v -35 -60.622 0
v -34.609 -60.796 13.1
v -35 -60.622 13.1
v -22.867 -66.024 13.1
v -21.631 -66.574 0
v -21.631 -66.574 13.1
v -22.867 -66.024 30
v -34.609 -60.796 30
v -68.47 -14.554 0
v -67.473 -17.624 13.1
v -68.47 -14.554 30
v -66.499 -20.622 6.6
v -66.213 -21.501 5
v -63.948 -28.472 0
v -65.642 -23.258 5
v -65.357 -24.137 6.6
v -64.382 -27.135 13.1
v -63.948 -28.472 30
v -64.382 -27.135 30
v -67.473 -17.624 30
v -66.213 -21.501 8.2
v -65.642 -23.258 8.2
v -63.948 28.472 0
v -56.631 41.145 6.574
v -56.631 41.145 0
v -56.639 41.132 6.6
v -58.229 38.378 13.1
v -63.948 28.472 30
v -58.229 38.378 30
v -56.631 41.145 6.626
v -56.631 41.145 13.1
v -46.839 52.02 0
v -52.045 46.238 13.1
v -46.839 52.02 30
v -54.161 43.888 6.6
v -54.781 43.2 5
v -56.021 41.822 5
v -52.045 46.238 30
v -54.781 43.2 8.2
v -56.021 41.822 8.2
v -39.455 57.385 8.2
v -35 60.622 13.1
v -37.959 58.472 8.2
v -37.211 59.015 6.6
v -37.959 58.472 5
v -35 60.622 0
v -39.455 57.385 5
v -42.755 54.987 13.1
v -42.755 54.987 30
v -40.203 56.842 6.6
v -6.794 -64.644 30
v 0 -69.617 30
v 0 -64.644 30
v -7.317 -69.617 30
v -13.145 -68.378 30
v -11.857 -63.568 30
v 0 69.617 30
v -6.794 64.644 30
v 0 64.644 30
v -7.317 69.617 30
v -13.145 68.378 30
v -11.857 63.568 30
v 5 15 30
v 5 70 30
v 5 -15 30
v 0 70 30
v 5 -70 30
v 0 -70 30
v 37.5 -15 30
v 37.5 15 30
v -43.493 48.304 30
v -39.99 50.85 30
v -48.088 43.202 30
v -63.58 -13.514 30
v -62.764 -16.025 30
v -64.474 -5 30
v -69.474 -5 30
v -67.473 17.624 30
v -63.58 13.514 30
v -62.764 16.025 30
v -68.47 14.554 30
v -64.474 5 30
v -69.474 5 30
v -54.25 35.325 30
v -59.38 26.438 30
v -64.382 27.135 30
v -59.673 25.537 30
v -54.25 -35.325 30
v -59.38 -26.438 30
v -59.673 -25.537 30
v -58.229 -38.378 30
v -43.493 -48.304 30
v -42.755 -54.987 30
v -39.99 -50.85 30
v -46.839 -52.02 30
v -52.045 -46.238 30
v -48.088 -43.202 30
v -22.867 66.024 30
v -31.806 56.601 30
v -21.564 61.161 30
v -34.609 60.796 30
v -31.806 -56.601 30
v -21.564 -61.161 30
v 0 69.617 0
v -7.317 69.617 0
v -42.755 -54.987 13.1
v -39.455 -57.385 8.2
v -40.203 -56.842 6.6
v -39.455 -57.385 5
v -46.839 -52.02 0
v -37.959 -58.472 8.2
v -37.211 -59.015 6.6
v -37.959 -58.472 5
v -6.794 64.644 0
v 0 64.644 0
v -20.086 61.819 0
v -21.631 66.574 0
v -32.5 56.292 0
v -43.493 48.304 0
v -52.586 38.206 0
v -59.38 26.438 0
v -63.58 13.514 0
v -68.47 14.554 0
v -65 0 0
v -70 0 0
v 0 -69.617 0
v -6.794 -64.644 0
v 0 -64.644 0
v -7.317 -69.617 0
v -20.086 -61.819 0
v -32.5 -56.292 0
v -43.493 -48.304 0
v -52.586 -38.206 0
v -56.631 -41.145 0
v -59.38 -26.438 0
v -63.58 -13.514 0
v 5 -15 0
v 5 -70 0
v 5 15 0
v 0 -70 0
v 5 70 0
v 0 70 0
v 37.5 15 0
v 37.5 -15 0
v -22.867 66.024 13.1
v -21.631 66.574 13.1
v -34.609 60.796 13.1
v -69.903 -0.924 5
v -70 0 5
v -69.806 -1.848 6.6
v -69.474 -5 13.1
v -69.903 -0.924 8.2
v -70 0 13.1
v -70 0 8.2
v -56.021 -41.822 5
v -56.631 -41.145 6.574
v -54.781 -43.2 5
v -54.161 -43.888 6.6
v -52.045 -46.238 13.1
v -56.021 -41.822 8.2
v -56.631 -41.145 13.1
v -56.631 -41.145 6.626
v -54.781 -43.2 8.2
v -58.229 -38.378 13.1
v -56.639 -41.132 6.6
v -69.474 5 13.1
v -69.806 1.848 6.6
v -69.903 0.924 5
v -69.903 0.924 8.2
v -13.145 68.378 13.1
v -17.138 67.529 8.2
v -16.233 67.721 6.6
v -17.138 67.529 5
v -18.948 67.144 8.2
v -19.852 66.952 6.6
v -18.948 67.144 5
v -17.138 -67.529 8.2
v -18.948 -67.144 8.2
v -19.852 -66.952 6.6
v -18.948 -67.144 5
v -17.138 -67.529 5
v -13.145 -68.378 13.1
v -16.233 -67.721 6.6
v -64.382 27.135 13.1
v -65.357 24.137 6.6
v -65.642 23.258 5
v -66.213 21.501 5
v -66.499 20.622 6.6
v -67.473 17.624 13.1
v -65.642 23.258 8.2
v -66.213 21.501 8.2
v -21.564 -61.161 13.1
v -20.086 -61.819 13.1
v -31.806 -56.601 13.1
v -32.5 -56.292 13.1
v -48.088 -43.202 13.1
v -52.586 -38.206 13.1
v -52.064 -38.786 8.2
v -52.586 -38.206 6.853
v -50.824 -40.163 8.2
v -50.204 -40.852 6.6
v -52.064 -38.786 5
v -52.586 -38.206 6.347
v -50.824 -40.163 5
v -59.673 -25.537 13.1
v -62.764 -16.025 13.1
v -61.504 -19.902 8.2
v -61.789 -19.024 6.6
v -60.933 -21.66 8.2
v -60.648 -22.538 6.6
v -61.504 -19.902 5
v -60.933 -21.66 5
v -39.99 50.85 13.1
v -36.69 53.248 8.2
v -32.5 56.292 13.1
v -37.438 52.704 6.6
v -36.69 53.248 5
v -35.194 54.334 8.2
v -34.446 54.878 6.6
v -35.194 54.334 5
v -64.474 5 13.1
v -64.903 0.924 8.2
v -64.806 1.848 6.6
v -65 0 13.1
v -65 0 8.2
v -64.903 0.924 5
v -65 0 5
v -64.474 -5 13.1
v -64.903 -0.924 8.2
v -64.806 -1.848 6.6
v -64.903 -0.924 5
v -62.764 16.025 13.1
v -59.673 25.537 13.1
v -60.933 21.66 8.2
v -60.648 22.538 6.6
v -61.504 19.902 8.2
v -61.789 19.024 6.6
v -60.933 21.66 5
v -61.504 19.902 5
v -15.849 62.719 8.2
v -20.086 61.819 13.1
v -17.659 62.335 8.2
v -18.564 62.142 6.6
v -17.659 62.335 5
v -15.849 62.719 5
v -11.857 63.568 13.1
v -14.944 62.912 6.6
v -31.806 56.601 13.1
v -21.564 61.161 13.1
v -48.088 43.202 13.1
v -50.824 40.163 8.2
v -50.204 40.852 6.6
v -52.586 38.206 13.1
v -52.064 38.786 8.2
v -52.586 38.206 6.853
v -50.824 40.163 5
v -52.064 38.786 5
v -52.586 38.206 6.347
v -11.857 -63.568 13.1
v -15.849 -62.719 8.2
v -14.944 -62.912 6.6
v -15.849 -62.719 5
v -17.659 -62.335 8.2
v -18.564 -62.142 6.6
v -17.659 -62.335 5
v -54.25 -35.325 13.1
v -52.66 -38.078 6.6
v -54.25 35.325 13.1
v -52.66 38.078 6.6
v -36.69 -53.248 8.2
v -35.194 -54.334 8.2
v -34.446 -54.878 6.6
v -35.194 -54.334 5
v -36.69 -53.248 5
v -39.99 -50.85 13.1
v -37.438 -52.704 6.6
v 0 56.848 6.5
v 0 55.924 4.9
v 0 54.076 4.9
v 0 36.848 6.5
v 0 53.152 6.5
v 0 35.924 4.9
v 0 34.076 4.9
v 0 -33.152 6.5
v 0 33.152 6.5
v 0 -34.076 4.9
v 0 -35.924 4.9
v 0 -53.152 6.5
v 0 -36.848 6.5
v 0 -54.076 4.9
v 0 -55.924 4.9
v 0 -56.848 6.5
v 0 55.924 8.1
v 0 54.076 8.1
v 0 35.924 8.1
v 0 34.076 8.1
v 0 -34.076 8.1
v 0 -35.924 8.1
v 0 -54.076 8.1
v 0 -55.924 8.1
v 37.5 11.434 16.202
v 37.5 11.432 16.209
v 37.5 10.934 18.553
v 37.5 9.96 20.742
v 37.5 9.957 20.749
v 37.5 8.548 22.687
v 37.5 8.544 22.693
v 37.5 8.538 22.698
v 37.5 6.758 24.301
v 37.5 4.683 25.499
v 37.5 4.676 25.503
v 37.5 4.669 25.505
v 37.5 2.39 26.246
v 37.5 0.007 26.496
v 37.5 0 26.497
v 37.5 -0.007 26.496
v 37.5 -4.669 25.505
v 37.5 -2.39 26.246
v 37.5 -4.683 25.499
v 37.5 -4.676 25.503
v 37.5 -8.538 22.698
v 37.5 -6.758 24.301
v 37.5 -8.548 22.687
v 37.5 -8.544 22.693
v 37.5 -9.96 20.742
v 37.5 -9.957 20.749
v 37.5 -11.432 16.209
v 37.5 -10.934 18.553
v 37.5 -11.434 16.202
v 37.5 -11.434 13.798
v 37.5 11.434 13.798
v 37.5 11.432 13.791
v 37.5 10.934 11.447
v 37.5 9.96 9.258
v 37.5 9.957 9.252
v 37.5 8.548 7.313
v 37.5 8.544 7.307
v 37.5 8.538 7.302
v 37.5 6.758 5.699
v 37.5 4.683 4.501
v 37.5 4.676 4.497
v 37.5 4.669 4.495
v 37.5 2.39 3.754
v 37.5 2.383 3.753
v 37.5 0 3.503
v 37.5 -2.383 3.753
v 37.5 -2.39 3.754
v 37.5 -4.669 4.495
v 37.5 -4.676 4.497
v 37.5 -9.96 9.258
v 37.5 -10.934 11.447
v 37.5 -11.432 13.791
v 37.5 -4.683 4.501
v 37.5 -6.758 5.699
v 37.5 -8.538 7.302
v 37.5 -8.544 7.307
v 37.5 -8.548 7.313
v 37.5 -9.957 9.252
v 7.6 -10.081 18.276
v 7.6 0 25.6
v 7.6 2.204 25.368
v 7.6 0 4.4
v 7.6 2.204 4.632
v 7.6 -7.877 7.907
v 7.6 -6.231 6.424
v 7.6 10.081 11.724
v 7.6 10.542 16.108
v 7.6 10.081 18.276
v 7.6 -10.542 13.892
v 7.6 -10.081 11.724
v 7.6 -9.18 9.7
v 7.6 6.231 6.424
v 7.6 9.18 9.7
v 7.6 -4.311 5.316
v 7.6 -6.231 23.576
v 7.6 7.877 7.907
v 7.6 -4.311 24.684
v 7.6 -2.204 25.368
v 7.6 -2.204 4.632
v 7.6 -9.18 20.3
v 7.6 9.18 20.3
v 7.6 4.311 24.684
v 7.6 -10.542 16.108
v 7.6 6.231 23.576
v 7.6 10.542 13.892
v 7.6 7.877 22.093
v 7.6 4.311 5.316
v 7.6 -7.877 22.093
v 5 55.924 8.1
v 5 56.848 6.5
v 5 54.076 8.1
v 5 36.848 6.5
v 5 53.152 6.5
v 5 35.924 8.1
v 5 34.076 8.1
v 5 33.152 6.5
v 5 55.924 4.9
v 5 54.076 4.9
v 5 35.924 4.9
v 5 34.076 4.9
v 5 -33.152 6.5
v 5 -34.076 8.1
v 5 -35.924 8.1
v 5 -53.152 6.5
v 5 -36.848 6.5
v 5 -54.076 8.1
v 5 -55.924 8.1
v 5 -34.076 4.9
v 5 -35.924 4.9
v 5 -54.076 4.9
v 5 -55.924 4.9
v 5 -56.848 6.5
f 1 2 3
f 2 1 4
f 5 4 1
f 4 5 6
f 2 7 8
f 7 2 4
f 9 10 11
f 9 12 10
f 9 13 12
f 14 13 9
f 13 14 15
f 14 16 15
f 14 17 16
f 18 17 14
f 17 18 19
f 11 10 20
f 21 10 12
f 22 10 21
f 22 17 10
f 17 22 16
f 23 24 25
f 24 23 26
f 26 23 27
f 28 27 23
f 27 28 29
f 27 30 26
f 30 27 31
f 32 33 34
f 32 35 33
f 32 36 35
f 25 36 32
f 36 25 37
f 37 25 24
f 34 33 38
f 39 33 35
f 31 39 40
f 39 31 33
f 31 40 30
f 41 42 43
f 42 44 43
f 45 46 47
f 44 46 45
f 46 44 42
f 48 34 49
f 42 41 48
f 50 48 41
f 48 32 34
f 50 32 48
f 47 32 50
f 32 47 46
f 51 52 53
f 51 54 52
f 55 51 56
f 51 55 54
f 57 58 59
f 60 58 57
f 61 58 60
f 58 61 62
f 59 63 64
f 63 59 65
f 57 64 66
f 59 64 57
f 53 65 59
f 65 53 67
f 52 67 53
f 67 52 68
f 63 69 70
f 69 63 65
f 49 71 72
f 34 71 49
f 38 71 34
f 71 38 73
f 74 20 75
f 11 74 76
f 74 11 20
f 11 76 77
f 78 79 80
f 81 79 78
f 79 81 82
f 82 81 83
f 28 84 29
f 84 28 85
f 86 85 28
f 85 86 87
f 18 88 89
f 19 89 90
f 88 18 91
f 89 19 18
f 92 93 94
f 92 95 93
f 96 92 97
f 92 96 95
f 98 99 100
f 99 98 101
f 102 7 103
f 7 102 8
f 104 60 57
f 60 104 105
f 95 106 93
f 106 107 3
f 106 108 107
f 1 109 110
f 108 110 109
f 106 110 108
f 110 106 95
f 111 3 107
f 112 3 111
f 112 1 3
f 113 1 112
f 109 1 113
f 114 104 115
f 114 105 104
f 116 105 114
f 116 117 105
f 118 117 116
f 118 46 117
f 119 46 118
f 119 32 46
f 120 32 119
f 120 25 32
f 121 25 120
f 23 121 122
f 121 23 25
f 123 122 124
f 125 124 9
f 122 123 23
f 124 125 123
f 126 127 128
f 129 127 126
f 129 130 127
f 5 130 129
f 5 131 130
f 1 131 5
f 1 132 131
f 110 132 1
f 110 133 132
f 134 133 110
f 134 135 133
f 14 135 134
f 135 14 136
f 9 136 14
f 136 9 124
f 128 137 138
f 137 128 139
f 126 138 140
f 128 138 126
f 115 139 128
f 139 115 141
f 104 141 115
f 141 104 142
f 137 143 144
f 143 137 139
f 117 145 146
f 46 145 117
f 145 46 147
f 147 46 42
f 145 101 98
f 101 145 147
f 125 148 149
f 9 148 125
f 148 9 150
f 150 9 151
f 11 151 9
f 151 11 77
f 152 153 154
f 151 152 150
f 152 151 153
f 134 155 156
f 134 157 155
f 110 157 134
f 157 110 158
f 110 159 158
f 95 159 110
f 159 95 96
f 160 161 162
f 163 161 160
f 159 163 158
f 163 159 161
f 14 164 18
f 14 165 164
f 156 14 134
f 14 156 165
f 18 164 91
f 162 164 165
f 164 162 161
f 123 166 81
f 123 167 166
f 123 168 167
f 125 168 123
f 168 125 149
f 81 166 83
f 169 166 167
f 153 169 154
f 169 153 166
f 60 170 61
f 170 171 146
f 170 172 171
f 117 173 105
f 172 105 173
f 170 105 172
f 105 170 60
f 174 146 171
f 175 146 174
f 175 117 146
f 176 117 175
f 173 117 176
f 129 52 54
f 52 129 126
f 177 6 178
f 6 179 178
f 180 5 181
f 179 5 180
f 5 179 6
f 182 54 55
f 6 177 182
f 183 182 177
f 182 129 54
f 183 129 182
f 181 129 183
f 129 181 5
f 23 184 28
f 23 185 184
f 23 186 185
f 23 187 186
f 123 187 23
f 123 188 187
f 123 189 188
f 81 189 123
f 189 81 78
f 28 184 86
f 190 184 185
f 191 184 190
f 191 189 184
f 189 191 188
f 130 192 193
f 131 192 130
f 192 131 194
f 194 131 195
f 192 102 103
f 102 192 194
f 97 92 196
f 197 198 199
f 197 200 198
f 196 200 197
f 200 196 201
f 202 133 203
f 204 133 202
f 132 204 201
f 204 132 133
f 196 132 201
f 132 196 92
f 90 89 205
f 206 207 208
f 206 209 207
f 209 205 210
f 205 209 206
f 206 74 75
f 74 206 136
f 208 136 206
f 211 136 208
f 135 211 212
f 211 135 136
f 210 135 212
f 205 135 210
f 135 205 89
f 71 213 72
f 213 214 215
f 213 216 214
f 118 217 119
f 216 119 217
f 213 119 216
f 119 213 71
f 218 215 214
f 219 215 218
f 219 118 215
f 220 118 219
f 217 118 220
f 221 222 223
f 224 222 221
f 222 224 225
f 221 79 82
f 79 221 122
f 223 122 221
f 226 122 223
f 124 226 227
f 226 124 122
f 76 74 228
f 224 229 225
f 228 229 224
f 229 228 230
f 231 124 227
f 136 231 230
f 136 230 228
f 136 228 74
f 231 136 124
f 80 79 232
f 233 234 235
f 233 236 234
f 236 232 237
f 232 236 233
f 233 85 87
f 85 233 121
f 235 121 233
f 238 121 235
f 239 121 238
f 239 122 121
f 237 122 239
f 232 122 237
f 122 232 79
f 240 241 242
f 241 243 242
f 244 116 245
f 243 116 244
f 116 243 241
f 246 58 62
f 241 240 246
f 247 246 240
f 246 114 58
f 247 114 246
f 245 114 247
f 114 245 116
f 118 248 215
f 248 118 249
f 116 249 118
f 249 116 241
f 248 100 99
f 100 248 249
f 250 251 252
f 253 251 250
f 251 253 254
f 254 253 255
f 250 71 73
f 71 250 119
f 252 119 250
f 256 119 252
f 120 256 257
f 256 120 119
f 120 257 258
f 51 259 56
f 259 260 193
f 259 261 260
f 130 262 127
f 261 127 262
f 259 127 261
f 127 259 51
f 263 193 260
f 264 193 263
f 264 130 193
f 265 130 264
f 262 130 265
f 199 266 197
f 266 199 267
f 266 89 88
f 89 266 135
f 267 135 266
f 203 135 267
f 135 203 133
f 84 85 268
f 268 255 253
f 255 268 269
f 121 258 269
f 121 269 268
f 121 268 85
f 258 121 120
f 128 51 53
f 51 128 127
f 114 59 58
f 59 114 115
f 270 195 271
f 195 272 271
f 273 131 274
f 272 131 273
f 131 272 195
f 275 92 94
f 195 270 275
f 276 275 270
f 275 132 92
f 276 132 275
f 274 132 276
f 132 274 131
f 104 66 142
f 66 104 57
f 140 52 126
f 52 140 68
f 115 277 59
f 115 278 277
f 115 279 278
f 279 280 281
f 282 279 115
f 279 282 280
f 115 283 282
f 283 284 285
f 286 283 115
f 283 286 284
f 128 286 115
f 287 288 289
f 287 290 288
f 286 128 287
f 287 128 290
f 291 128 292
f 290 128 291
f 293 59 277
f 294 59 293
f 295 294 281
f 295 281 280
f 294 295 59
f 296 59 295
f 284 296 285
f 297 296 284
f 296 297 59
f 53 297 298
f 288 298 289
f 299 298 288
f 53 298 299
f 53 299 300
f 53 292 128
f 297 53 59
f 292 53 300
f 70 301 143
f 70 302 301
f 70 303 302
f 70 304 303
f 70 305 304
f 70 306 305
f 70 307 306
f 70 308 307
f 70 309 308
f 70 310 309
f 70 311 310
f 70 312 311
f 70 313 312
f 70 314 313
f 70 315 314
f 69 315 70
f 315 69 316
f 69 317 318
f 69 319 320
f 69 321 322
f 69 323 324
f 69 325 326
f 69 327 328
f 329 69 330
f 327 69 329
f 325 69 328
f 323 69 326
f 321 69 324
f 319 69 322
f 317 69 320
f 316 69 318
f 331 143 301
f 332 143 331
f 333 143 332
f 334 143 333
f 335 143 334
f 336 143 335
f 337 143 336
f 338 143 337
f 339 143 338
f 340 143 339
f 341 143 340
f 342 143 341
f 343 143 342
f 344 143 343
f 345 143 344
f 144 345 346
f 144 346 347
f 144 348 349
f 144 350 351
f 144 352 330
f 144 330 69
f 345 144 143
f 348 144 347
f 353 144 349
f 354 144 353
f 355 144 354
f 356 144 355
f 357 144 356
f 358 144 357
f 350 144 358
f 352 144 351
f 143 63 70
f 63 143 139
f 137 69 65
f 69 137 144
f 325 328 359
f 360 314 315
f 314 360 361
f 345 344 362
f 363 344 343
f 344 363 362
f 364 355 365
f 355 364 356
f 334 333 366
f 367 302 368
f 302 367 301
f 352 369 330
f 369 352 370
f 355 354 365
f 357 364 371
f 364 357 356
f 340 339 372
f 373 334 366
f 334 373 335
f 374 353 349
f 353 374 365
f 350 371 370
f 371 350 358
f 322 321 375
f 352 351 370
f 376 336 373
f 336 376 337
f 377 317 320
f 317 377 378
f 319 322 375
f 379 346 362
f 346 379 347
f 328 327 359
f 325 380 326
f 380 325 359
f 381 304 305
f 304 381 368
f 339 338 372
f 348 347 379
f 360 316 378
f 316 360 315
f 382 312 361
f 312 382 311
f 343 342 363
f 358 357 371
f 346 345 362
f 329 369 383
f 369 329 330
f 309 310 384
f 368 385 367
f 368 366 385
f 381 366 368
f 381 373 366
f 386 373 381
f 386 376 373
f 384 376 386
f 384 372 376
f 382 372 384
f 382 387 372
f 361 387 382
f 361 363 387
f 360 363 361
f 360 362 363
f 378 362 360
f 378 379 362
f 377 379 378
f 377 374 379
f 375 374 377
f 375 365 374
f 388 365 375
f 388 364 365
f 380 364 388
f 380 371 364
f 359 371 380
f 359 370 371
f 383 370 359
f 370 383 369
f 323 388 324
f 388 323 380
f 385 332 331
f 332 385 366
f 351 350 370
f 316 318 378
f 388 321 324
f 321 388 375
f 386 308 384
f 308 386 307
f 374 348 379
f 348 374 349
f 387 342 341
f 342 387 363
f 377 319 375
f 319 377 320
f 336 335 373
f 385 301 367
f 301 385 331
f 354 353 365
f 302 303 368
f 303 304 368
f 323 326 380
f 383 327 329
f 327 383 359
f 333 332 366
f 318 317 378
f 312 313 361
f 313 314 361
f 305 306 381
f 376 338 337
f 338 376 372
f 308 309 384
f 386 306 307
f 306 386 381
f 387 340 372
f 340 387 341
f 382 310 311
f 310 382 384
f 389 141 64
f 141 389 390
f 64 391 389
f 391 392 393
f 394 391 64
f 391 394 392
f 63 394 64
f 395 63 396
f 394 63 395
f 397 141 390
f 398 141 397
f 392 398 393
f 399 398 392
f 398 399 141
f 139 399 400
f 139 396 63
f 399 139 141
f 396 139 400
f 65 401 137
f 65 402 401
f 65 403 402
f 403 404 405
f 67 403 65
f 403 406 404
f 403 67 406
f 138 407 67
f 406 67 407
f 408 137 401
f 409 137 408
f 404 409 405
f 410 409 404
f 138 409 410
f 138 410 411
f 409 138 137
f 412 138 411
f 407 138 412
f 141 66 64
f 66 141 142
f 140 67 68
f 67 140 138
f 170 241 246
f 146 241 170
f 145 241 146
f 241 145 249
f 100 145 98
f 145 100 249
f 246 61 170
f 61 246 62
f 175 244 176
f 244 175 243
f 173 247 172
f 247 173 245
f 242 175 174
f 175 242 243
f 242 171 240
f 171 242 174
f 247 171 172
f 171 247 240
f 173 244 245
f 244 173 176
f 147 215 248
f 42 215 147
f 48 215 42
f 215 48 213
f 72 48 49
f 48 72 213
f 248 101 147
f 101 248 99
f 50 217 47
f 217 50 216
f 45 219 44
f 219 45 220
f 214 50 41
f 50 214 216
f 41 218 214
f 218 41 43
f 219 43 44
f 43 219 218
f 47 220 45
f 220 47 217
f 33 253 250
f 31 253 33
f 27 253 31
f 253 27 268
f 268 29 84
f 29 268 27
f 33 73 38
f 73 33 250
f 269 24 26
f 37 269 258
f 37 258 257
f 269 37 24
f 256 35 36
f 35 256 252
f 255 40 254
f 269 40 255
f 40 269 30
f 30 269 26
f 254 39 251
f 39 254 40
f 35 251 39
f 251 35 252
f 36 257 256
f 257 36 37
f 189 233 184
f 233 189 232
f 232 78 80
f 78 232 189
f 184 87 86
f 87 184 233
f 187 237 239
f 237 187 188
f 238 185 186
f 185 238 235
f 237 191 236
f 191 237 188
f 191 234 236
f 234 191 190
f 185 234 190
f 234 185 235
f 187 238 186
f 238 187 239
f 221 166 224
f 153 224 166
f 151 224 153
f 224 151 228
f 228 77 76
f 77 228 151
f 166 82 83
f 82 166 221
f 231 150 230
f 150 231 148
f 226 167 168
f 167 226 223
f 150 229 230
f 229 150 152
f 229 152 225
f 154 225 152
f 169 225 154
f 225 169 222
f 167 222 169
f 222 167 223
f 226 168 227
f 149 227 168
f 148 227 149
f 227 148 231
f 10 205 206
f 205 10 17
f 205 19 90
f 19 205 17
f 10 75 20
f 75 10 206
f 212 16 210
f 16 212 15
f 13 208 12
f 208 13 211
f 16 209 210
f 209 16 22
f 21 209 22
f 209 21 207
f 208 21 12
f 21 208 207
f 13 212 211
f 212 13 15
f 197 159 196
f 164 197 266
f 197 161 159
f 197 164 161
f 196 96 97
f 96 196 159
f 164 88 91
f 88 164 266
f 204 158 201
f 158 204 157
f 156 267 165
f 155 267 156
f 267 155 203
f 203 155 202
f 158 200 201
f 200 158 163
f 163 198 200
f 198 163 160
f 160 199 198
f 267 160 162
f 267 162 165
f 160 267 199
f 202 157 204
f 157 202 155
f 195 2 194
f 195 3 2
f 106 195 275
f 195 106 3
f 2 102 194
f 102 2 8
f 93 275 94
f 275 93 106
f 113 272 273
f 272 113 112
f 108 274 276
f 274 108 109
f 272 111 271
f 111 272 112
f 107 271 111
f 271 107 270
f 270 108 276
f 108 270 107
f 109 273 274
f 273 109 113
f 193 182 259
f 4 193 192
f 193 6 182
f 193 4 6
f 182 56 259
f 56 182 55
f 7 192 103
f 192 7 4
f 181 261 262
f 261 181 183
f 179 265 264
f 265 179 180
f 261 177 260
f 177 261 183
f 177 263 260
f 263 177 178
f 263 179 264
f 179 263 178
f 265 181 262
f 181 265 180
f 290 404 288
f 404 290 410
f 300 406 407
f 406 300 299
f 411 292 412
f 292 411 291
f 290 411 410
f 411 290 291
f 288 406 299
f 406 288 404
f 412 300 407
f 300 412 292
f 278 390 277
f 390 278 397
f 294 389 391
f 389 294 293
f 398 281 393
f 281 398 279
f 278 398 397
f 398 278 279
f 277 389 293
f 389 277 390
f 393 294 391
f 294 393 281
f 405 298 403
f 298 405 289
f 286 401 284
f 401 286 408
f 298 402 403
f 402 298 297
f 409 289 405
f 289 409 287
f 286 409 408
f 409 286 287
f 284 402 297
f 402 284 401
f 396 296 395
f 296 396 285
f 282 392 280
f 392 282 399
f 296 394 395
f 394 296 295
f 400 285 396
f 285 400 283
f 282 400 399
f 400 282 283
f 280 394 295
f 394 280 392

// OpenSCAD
/*-----------------------------------------------------------------------------------

 fruitpicker
 (c) 2014 by Stemer114 (stemer114@gmail.com)
 http://www.thingiverse.com/Stemer114/designs
 License: licensed under the 
          Creative Commons - Attribution - Share Alike license. 
          http://creativecommons.org/licenses/by-sa/3.0/

 Credits: 
          MCAD Library - Polyholes Copyright 2011 Nophead (of RepRap fame)
          It is licensed under the terms of Creative Commons Attribution 3.0 Unported.
          https://github.com/SolidCode/MCAD/blob/master/polyholes.scad

-----------------------------------------------------------------------------------
*/

//-----------------------------------------------------------------------------------
//libraries
//-----------------------------------------------------------------------------------
//polyholes lib is in local dir
use <MCAD/polyholes.scad>

//-----------------------------------------------------------------------------------
// View settings
// (when exporting single stls for printing, enable these one by one)
//-----------------------------------------------------------------------------------
show_picker = true;  

//-----------------------------------------------------------------------------------
// printer/printing settings
// (some dimensions are tuned to printer settings)
//-----------------------------------------------------------------------------------
layer_h = 0.3;  //layer height when printing
nozzle_d = 0.4; //nozzle size (adjust for your printer)

//-----------------------------------------------------------------------------------
//global configuration settings
//-----------------------------------------------------------------------------------
de = 0.1; //epsilon param, so differences are scaled and do not become manifold
//fn_hole = 12;  //fn setting for round holes/bores (polyholes use their own algorithm)


//-----------------------------------------------------------------------------------
//parametric settings (object dimensions)
//-----------------------------------------------------------------------------------
P10 = 140;  //outer diameter (picker is only half circle)
P11 = 5;    //thickness
P12 = 30;   //height
//Aussparungen
P20 = 17;   //height
P21 = 10;   //width
P22 = 9;   //count
P23 = 210;   //exception angle (where handle is connected)
//attachment bores
P25 = 3.2;  //diameter
P26 = (P12-P20)/2;  //height offset from base
P27 = 15;    //backside outer bore offset from edge
P28 = 35;    //         inner
//connector
P30 = 35;  //length
P31 = 30;  //inner length
P32 = 21.2;  //inner dia
P33 = 23;    //outer dia
P35 = 30;    //height
P36 = 30;    //width


//-----------------------------------------------------------------------------------
// main rendering
//-----------------------------------------------------------------------------------

assembly();

//-----------------------------------------------------------------------------------
// modules
//-----------------------------------------------------------------------------------

module assembly()
{
    union()
    {

        if (show_picker) {
            picker();
        }  //end if

        }  //end union
}  //end module


module picker()
{
    difference()
    {
        union()
        {
            //base ring
            //cut half of it away
            difference()
            {
            ring(h=P12, od=P10, id=P10-2*P11);
            translate([0, -P10/2-de, -de])
                cube([P10, P10+2*de, P12+2*de]);
            }
            //flat wall
            translate([0, -P10/2, 0])
            cube([P11, P10, P12]);

            //connector body with handle cutout
            translate([P11/2, -P36/2, 0])
                difference()
                {
                    cube([P30, P36, P35]);
                    translate([P30-P31+de, P36/2, P35/2])
                        rotate([0, 90, 0])
                        cylinder(h=P31, r1=P32/2, r2=P33/2, center=false);
                }


        }  //union 1

        union()
        {
            //cutouts
            translate([0, 0, P12-P20+de])
                for ( i = [0 : P22-1] )
                {
                    rotate( 0.5 * P23 + i * (360 - P23) / (P22-1), [0, 0, 1])
                        translate([P10/2-2*P11, 0, 0])
                        {
                        translate([0, -P21/2, 0]) cube([P10, P21, P20+de]);
                        translate([0, 0, -P26]) rotate([90, 0, 90]) polyhole(h=P10, d=P25);

                        }
                }

            //attachment bores in flat side
            //outer
            translate([-de, -P10/2+P27, P26])
                rotate([90, 0, 90]) polyhole(h=P11+2*de, d=P25);
            translate([-de, P10/2-P27, P26])
                rotate([90, 0, 90]) polyhole(h=P11+2*de, d=P25);
            //inner
            translate([-de, -P10/2+P28, P26])
                rotate([90, 0, 90]) polyhole(h=P11+2*de, d=P25);
            translate([-de, P10/2-P28, P26])
                rotate([90, 0, 90]) polyhole(h=P11+2*de, d=P25);
  


        }  //union 2
    }  //difference
}

//a ring with heigth h, outside diameter od and inside diameter id
module ring(
        h=1,
        od = 10,
        id = 5
        ) 
{
    difference() {
        cylinder(h=h, r=od/2);
        translate([0, 0, -de])
            cylinder(h=h+2*de, r=id/2);
    }
}
